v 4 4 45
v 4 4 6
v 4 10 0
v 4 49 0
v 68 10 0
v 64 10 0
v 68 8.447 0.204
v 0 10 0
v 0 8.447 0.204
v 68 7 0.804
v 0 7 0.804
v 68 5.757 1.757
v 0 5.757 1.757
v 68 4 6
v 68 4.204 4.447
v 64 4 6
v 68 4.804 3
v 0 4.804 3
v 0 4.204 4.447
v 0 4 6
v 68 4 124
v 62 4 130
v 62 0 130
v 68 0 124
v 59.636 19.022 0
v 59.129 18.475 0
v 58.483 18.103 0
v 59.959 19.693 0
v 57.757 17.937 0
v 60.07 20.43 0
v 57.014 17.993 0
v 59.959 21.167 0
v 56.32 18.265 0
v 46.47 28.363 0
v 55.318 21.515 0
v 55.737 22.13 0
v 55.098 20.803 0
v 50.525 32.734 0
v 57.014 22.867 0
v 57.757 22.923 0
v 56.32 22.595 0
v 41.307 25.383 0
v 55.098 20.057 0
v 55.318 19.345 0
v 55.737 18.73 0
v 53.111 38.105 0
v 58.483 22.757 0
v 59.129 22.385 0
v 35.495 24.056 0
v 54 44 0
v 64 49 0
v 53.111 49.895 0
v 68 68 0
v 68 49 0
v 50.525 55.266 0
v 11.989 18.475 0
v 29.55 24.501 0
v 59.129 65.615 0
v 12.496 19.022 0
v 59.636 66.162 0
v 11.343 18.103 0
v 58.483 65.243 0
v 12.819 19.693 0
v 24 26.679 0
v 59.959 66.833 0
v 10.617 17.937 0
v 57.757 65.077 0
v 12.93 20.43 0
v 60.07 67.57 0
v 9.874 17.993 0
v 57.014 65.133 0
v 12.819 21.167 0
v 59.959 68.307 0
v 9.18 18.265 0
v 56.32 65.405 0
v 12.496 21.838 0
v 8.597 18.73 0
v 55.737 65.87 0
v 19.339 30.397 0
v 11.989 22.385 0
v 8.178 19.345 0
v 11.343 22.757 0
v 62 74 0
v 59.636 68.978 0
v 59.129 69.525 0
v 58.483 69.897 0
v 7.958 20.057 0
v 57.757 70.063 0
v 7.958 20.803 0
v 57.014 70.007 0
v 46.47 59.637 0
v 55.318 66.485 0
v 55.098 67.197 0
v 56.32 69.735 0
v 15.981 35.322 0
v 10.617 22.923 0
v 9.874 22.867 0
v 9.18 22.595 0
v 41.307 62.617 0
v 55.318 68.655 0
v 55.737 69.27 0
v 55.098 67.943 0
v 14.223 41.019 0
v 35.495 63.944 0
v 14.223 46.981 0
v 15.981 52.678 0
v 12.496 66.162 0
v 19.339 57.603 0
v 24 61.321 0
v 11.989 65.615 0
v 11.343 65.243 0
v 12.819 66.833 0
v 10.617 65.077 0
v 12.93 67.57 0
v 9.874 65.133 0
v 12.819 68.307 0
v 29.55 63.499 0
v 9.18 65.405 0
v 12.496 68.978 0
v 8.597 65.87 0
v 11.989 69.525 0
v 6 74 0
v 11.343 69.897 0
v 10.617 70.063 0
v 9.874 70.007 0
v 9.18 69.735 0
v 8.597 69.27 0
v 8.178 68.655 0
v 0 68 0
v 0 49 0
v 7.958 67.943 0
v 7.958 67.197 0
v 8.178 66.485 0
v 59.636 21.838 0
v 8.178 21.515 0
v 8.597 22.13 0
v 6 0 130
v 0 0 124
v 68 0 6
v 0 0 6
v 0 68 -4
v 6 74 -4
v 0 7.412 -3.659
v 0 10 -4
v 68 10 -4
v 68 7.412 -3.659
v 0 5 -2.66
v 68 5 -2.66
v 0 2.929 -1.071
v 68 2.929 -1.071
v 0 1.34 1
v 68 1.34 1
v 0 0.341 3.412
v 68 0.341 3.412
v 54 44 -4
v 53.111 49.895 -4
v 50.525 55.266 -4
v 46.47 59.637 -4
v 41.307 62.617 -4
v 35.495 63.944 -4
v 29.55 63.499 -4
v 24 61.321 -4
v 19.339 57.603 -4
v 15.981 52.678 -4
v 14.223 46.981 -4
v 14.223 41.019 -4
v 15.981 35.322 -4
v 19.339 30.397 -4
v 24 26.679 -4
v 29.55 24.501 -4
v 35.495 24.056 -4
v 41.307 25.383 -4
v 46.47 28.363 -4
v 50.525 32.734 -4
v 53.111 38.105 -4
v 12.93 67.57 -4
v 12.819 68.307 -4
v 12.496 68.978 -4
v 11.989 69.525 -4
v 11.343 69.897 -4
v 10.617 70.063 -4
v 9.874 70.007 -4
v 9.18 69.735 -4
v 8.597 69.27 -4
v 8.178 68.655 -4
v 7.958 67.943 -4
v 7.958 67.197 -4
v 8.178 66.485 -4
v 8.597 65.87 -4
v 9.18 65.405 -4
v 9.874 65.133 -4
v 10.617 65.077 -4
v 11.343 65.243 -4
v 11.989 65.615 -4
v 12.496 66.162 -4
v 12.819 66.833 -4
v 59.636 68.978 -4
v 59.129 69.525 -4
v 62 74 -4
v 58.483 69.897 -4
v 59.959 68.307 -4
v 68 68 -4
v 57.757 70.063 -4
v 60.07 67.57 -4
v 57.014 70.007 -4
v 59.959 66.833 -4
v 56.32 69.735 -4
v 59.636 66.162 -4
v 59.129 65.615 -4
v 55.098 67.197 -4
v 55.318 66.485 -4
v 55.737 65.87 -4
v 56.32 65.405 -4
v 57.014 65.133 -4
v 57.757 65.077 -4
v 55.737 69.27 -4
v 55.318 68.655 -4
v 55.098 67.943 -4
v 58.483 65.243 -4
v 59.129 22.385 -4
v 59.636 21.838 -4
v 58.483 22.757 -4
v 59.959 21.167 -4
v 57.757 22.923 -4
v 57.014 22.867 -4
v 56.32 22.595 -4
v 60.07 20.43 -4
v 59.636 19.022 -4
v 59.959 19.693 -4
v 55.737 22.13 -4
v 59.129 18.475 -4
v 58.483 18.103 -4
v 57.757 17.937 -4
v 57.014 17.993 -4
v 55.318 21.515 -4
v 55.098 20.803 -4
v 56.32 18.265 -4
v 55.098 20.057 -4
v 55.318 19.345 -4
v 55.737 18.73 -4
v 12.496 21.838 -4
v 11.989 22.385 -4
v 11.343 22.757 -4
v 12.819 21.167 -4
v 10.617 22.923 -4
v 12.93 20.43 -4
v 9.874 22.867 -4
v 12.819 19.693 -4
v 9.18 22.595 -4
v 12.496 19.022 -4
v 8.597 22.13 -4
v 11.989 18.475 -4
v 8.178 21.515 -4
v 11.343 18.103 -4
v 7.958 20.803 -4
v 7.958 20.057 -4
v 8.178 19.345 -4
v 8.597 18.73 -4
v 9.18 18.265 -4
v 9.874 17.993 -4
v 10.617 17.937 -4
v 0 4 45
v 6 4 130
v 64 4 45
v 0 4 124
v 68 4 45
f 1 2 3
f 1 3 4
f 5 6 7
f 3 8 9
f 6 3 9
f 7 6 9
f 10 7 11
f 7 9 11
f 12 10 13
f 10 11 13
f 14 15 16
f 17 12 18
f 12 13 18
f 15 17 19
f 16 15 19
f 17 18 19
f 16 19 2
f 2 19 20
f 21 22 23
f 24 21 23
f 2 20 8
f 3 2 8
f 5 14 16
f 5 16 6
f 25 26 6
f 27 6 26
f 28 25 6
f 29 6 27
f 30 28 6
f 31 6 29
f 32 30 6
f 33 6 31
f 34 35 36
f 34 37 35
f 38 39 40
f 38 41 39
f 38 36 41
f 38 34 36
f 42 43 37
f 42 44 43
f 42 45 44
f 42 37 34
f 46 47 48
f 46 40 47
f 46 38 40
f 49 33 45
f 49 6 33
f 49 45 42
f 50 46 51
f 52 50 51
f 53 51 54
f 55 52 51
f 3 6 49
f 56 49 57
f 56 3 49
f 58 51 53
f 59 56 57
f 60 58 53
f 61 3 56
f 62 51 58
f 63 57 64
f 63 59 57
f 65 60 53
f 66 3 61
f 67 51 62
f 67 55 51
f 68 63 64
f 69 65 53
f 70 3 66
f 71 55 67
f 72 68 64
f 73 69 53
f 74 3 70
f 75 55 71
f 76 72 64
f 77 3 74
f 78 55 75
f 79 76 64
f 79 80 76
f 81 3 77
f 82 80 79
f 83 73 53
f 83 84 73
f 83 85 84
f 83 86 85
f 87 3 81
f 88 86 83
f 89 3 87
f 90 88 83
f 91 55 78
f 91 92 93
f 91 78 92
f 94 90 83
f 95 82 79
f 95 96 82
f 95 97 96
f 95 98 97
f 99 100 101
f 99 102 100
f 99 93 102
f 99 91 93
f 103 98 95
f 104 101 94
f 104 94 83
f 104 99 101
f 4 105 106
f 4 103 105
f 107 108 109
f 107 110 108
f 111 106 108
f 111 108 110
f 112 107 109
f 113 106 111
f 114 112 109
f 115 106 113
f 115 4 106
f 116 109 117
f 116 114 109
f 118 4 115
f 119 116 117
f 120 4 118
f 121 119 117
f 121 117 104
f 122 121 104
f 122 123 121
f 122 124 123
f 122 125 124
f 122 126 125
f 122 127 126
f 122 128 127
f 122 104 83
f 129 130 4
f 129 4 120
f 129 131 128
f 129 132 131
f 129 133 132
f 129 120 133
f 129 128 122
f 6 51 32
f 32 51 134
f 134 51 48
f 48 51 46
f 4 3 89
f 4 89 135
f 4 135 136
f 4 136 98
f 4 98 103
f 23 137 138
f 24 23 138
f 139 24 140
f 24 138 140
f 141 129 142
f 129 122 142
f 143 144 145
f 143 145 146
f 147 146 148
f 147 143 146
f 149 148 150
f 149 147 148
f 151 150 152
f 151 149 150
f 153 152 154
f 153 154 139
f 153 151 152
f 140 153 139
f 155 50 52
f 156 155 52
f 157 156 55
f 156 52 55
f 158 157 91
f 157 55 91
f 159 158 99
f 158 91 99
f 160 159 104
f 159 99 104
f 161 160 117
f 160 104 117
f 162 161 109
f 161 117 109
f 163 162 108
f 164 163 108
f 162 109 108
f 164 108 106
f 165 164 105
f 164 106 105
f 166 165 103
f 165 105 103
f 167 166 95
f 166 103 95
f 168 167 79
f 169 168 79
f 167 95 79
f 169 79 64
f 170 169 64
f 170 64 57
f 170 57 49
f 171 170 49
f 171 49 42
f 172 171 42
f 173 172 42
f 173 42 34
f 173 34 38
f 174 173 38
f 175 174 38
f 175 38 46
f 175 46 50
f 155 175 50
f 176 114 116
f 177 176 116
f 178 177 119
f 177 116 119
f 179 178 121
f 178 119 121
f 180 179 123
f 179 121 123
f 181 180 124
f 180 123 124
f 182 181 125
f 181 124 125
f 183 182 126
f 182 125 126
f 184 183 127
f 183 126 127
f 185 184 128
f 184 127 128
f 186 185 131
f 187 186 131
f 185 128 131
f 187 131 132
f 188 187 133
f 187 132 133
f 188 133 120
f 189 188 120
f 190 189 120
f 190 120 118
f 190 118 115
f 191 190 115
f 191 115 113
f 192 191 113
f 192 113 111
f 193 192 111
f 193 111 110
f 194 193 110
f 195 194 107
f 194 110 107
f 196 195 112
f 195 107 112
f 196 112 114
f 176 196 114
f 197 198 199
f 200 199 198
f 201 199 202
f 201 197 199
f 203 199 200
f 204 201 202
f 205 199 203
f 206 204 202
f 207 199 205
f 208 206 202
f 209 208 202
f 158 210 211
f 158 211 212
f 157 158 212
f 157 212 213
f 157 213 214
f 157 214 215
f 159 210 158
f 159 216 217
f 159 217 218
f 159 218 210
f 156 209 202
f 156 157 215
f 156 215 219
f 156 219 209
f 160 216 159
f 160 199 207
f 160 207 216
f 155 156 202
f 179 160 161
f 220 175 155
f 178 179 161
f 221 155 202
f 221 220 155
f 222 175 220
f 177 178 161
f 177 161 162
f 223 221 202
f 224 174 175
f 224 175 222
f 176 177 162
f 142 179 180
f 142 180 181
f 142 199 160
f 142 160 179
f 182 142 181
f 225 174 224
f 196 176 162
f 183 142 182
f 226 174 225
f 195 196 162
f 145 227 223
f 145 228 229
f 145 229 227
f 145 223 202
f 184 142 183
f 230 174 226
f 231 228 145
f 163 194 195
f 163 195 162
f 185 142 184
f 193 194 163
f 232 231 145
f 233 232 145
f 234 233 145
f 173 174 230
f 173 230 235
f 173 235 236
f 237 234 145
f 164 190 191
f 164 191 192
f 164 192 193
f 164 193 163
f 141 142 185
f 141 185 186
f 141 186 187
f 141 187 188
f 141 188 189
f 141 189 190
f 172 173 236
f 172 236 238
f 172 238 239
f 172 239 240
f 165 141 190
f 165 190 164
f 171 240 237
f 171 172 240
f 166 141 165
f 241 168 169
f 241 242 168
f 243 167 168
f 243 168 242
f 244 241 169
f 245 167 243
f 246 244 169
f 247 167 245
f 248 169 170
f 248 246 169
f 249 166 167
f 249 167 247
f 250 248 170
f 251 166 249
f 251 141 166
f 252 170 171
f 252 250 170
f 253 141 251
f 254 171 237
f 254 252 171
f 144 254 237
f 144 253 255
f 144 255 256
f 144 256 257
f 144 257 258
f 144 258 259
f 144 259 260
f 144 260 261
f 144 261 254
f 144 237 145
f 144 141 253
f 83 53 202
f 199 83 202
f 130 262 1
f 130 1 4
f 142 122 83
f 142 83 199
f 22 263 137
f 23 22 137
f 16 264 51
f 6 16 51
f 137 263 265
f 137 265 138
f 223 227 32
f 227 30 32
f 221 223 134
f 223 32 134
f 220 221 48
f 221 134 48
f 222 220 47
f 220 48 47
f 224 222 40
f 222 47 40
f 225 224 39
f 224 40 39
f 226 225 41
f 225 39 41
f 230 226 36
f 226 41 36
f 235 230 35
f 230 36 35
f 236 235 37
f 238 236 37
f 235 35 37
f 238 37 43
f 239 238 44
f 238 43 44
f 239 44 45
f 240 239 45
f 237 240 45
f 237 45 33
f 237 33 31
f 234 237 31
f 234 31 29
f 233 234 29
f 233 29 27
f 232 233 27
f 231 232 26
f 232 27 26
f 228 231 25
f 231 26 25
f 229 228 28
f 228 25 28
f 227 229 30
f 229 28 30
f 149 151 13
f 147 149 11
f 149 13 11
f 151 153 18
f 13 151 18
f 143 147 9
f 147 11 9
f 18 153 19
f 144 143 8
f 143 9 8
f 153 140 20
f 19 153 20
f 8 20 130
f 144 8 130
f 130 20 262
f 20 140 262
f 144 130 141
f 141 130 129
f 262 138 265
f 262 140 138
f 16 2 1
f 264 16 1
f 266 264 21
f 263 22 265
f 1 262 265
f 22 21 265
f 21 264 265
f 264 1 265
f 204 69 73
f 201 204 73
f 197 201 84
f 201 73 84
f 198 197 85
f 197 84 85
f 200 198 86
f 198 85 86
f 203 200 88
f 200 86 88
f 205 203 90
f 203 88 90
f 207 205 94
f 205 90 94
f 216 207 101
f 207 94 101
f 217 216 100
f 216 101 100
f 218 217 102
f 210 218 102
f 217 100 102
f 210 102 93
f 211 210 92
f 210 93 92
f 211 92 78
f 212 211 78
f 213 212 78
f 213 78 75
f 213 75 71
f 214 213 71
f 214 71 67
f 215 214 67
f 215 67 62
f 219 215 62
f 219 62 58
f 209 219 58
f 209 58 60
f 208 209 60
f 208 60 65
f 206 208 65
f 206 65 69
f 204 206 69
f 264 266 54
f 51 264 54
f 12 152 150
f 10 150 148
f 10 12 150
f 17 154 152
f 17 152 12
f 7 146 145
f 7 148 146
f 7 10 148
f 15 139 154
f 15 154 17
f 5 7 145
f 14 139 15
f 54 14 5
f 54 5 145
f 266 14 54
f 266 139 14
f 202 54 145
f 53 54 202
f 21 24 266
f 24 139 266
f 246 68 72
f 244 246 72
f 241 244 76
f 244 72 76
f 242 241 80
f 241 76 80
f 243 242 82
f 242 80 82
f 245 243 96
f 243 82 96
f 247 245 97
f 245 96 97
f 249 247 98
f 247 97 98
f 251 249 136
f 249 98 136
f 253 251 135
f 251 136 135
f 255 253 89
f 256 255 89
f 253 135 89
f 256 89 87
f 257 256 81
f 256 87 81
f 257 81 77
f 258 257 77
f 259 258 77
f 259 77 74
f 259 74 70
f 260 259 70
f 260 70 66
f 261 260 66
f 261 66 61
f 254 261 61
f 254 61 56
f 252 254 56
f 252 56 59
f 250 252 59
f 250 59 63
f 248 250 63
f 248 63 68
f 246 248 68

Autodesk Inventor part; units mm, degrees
ref_plane "YZ Plane" through (0, 0, 0) normal (1, 0, 0) x (0, 1, 0)
ref_plane "XZ Plane" through (0, 0, 0) normal (0, 1, 0) x (-1, 0, 0)
sketch "Sketch1" plane through (0, 0, 0) normal (1, 0, 0) x (0, 1, 0)
  line L0 (0, 0) -> (4, 0)
  line L1 (4, 6) -> (4, 130)
  line L2 (4, 130) -> (0, 130)
  line L3 (0, 130) -> (0, 0)
  line L4 (10, 0) -> (74, 0)
  line L5 (74, 0) -> (74, -4)
  line L6 (74, -4) -> (10, -4)
  line L7 (0, 6) -> (0, 0)
  line L8 (4, 45) -> (49, 0)
  arc A0 (4, 6) -> (10, 0) centre (10, 6) ccw
  arc A1 (0, 6) -> (10, -4) centre (10, 6) ccw
  line L9 (4, 6) -> (10, 0)
  point P0 (0, -4)
  point P1 (0, 6)
  point P2 (2, 0)
  dimension "d0" = 4
  dimension "d1" = 130
  dimension "d2" = 70
  dimension "d3" = 45
  dimension "d4" = 45
  dimension "d35" = 10
extrude "Extrusion1" add sketch "Sketch1" along normal blind 68 contours A1 L3 L2 L1 A0 L4 L5 L6
extrude "Extrusion2" add sketch "Sketch1" along normal blind 4 contours L8 L4 L9 L1
extrude "Extrusion3" add sketch "Sketch1" against normal blind 4 from surface at 68 contours L8 L4 L9 L1
sketch "Sketch2" plane through (0, 74, 0) normal (0, 0, 1) x (1, 0, 0)
  line L0 (0, 0) -> (68, 0) construction
  line L1 (4, 0) -> (64, 0) construction
  line L2 (64, 0) -> (64, -60) construction
  line L3 (64, -60) -> (4, -60) construction
  line L4 (4, -60) -> (4, 0) construction
  line L5 (4, -25) -> (4, -70) construction
  line L6 (64, -70) -> (64, -25) construction
  line L7 (10.43, -6.43) -> (57.57, -6.43) construction
  line L8 (57.57, -6.43) -> (57.57, -53.57) construction
  line L9 (57.57, -53.57) -> (10.43, -53.57) construction
  line L10 (10.43, -53.57) -> (10.43, -6.43) construction
  line L11 (4, 0) -> (64, -60) construction
  line L12 (4, -60) -> (64, 0) construction
  circle A0 centre (34, -30) radius 20
  circle A1 centre (10.43, -6.43) radius 2.5
  circle A2 centre (57.57, -6.43) radius 2.5
  circle A3 centre (57.57, -53.57) radius 2.5
  circle A4 centre (10.43, -53.57) radius 2.5
  dimension "d26" = 60
  dimension "d27" = 60
  dimension "d28" = 47.14
  dimension "d29" = 40
  dimension "d30" = 5
extrude "Extrusion4" cut sketch "Sketch2" against normal through all
chamfer "Chamfer1" distance 6 angle 45 4 edges at (68, 74, -2) (0, 74, -2) (68, 2, 130) (0, 2, 130)
ref_plane "Work Plane1" through (34, 0, 0) normal (1, 0, 0) x (0, 0, -1)
properties part number "MotorBracket" material "Stainless Steel"
